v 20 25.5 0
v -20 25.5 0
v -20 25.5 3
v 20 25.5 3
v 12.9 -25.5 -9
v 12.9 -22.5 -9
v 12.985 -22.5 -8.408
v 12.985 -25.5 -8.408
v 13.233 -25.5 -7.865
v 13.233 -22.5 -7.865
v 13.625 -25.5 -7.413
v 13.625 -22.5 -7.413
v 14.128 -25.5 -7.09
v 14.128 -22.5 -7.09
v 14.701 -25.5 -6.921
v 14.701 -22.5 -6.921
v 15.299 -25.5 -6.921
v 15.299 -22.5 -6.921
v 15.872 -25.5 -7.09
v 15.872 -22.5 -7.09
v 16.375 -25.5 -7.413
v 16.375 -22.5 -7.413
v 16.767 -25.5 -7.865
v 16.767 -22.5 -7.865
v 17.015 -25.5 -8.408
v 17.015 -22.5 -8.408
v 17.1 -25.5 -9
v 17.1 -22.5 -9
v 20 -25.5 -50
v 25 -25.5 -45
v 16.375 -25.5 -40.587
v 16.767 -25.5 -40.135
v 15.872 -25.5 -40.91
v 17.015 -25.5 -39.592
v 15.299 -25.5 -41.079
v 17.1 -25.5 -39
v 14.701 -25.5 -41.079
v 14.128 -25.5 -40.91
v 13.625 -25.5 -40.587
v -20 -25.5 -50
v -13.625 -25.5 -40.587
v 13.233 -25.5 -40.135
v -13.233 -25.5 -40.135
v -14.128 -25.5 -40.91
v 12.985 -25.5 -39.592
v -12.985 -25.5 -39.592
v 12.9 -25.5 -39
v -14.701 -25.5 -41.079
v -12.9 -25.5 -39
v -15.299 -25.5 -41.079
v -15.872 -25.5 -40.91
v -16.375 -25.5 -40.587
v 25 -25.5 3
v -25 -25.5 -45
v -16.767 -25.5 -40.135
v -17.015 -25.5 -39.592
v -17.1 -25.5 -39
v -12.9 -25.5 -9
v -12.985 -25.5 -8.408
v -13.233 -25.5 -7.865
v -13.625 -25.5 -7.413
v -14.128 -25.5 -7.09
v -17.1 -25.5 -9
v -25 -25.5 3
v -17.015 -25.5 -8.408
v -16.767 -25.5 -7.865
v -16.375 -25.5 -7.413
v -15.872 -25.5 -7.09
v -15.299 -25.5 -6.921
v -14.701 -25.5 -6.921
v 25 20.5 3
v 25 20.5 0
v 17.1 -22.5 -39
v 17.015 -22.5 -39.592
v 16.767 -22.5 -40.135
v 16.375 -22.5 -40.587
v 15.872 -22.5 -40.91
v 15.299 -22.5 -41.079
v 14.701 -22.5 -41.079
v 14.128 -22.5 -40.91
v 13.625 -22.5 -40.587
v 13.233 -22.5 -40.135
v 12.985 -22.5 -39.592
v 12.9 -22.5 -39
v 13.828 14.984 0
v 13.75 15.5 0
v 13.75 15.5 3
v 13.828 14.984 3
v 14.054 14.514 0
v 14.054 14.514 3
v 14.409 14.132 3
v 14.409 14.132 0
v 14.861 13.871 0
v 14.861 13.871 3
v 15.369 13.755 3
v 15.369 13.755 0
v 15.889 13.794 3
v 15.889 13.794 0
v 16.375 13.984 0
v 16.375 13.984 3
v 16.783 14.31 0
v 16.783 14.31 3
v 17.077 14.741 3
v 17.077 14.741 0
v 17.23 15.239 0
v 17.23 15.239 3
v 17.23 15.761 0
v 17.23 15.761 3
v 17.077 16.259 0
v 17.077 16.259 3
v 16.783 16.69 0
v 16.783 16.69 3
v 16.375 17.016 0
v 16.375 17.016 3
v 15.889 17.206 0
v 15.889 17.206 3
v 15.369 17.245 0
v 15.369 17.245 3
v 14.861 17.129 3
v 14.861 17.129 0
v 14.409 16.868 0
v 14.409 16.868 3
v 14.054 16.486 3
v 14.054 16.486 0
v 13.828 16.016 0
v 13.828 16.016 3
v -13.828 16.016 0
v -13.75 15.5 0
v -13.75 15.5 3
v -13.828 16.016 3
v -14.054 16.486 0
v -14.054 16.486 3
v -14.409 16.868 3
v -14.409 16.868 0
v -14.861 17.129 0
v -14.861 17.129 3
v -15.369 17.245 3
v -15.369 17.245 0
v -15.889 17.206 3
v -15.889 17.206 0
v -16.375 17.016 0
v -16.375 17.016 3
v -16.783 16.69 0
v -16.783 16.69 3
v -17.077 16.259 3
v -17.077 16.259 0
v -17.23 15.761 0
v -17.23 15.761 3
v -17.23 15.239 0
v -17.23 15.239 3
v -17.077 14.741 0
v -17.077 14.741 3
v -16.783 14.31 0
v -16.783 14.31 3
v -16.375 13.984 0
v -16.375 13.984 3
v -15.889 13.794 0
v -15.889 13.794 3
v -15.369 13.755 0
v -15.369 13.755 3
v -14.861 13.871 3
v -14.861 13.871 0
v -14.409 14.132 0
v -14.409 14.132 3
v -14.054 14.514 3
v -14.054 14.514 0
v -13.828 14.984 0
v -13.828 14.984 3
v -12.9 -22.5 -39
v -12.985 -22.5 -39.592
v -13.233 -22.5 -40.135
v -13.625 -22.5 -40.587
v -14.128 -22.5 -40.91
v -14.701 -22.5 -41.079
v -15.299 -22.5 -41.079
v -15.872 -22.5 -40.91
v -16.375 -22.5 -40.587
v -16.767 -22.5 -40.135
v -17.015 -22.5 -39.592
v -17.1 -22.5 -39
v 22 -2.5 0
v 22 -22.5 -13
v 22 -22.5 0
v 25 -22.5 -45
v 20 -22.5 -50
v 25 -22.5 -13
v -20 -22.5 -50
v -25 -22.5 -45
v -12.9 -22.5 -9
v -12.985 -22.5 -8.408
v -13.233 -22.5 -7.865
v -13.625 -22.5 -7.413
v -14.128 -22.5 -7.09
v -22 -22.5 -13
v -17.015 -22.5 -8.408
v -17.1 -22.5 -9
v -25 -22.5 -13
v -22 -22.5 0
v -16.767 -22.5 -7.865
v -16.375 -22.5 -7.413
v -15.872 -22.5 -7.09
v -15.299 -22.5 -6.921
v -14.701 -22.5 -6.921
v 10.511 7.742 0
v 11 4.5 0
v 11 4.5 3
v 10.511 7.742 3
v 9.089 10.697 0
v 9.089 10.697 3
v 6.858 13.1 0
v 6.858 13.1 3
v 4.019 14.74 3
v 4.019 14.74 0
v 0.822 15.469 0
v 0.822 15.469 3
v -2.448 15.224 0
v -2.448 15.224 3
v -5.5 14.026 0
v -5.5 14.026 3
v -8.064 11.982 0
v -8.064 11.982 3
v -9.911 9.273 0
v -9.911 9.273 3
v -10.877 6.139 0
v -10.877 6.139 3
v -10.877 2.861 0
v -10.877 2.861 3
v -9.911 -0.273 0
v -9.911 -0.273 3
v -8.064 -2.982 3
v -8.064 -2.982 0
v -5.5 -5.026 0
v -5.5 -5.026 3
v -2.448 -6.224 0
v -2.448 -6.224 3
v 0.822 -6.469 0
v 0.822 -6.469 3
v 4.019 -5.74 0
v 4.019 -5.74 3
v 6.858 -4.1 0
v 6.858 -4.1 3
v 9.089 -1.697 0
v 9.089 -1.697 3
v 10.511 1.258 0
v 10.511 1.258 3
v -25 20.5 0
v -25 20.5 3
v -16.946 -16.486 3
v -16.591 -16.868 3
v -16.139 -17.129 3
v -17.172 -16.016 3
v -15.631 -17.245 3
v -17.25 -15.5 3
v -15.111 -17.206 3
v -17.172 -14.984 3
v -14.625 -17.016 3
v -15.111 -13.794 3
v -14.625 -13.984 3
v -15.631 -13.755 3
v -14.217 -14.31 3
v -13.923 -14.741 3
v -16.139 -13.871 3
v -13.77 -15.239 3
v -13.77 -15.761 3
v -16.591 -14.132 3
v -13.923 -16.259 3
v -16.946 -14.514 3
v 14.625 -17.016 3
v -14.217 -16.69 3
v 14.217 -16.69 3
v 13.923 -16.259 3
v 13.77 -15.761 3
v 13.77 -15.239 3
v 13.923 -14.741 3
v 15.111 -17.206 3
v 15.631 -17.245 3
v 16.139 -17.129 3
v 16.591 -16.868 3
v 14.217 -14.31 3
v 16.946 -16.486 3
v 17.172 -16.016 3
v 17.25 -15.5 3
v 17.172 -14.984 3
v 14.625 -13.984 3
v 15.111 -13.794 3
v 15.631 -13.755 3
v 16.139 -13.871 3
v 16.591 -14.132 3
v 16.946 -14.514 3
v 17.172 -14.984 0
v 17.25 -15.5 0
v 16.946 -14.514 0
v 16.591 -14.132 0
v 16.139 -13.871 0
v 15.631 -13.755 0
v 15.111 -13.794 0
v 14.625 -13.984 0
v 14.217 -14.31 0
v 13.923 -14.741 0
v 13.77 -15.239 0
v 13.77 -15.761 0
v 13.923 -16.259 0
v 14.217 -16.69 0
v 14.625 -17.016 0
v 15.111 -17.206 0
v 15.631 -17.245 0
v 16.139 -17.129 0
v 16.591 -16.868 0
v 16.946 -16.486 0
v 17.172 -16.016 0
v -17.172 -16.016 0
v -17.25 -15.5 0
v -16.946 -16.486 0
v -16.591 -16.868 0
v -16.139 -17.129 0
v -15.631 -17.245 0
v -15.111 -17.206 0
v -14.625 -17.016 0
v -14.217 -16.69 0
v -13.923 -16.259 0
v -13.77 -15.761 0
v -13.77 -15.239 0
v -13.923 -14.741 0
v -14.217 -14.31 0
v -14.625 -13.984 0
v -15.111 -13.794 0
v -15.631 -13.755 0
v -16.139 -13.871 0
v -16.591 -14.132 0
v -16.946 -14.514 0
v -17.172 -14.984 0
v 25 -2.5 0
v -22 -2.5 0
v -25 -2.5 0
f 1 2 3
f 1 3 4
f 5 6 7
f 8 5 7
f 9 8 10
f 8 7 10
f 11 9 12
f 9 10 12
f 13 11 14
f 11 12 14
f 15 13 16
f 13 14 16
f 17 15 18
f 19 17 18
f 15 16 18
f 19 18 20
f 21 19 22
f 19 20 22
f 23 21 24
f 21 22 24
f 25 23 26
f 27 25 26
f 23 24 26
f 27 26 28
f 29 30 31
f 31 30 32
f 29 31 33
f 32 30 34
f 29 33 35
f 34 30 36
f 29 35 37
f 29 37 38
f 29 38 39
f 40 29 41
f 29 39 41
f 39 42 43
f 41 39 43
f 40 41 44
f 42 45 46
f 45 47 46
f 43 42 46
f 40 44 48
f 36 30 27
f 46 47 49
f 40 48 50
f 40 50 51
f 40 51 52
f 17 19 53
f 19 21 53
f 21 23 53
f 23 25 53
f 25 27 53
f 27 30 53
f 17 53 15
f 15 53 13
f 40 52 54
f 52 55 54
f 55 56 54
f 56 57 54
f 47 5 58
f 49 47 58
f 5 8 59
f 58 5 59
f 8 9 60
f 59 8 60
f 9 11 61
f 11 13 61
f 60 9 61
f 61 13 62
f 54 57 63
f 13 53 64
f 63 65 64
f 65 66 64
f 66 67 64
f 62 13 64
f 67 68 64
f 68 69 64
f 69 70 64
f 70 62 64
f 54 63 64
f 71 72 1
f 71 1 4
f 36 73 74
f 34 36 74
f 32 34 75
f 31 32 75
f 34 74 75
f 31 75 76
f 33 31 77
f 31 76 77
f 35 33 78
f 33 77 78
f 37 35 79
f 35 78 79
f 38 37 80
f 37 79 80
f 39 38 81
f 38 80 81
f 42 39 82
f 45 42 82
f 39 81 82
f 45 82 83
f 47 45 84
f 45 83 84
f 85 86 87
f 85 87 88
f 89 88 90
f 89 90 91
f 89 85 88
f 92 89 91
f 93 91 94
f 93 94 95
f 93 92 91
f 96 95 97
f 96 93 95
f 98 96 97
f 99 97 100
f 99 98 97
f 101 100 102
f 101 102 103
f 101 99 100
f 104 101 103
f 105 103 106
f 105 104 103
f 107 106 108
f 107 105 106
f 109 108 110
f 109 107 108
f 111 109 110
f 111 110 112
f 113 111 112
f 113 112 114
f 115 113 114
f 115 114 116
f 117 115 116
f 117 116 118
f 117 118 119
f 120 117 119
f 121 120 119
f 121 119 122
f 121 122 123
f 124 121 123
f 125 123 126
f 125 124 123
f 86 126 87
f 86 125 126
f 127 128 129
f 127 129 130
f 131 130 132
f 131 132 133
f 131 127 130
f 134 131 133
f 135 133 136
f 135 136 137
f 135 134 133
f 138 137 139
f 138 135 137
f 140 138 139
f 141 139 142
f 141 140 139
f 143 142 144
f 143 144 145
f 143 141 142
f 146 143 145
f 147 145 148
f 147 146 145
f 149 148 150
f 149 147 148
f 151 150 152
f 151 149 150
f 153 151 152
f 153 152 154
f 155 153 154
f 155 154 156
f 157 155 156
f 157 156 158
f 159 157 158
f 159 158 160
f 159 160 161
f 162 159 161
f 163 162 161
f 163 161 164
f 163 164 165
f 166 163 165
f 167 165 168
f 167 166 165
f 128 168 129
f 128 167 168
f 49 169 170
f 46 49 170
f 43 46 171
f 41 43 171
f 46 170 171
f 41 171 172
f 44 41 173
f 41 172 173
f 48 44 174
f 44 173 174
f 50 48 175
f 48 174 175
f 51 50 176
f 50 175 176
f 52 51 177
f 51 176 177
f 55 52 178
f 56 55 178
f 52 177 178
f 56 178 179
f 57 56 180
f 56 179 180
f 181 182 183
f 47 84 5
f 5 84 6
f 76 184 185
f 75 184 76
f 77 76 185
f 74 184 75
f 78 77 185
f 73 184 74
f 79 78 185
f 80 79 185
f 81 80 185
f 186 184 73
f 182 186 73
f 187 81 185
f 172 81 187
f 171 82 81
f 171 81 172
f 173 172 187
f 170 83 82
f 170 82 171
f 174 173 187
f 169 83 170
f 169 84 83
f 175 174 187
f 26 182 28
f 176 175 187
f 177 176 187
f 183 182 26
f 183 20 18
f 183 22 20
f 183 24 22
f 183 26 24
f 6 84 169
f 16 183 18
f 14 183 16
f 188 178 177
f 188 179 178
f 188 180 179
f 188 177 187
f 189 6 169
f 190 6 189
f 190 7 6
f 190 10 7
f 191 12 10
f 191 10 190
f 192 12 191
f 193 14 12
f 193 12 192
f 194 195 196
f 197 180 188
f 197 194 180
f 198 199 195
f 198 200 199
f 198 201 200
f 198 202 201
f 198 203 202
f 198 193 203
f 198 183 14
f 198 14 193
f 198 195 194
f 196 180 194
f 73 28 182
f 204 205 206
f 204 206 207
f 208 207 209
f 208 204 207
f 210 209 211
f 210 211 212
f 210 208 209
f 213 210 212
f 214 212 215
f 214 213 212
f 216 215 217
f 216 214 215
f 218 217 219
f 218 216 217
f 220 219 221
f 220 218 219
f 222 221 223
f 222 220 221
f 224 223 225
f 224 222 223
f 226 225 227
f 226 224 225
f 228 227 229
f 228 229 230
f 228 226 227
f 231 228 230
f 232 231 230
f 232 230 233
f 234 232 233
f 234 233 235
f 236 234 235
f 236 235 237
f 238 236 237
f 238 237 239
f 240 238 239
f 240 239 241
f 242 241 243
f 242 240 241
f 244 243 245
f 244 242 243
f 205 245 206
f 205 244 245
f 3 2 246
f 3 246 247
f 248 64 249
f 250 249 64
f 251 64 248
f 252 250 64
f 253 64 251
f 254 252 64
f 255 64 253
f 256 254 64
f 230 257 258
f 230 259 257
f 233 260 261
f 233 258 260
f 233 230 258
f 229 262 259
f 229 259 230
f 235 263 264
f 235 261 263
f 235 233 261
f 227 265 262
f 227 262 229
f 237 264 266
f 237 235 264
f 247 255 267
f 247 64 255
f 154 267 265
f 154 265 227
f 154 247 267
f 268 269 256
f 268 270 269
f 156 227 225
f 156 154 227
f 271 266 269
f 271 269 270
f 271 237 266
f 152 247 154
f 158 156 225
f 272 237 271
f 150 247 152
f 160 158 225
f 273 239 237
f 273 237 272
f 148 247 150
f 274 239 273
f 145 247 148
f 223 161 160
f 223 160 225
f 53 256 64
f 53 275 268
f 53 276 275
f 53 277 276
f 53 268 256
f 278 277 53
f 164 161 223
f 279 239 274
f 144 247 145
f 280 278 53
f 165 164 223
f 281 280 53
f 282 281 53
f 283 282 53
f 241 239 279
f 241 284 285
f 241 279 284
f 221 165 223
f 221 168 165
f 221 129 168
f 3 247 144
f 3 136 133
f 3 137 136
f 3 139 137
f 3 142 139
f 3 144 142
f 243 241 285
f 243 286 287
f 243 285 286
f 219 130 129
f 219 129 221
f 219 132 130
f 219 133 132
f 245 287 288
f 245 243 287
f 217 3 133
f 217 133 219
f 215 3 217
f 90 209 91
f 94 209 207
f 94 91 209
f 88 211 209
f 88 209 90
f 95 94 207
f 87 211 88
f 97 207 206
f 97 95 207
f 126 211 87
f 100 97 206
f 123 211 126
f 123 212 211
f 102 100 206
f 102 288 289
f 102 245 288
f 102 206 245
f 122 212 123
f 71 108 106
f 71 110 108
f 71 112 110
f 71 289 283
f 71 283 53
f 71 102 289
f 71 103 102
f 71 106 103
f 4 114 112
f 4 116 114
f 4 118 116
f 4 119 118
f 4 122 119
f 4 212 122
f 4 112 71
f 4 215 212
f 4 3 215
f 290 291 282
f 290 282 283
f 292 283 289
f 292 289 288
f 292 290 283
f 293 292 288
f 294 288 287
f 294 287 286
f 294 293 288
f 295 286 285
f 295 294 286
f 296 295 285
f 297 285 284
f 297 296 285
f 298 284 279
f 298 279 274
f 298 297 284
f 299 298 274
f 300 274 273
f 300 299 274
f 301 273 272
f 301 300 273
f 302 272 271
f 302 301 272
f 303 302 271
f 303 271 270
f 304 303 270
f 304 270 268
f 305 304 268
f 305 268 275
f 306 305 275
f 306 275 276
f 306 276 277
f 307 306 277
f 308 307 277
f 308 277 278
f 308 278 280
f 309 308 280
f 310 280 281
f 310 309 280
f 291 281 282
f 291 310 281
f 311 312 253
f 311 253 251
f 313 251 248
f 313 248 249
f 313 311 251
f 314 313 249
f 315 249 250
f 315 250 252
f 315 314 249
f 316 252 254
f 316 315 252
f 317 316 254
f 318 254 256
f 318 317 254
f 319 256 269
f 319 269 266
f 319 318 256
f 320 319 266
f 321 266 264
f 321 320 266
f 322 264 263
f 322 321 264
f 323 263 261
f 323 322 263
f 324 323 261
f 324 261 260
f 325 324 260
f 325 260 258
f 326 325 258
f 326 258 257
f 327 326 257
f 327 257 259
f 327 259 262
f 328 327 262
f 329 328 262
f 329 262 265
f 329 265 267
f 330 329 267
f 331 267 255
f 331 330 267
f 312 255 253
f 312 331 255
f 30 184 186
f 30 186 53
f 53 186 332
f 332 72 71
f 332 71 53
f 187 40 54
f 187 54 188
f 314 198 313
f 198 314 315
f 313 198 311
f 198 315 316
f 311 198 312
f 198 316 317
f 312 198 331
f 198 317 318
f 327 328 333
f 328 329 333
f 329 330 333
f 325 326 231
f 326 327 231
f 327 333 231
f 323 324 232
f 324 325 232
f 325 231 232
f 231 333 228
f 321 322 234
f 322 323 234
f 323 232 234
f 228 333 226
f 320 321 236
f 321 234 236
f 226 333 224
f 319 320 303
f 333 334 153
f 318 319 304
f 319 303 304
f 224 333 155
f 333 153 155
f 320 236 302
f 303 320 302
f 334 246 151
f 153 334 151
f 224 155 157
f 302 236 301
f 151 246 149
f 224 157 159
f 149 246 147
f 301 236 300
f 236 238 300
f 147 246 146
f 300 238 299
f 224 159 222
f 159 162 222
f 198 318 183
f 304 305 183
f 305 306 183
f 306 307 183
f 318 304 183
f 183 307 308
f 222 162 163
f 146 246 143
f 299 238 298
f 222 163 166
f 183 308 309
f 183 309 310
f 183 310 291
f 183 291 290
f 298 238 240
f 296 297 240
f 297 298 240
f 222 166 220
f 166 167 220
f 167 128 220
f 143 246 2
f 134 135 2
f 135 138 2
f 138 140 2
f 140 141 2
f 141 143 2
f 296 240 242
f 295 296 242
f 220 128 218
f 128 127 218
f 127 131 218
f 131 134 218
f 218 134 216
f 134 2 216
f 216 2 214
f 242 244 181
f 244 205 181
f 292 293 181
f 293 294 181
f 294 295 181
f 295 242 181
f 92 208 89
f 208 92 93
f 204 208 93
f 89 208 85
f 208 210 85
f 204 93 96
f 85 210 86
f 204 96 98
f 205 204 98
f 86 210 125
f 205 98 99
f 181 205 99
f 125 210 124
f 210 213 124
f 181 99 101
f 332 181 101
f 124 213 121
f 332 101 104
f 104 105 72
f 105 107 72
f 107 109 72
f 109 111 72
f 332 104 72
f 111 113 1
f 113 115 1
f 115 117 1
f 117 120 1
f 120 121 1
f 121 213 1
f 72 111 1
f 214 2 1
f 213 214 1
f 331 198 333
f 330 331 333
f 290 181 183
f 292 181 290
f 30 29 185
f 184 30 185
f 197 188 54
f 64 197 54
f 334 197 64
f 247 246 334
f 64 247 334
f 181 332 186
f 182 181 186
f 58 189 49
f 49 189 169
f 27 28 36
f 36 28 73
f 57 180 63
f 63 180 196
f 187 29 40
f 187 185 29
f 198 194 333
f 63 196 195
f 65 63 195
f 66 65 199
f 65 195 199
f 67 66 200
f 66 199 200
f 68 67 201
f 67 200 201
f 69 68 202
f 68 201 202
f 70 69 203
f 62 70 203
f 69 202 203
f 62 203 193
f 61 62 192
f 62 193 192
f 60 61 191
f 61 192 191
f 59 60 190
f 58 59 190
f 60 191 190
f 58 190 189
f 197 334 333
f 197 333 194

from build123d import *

# Parameters (mm, degrees)
SKETCH_1_W          = 50
SKETCH_1_H          = 51
SKETCH_1_R          = 11
SKETCH_1_R_2        = 1.75
EXTRUDE_1_DEPTH     = 3
CHAMFER_1_SIZE      = 5
SKETCH_2_W          = 50
SKETCH_2_H          = 3
EXTRUDE_2_DEPTH     = 50
CHAMFER_2_SIZE      = 5
CUT_EXTRUDE_1_DEPTH = 50
EXTRUDE_3_DEPTH     = 3
EXTRUDE_4_DEPTH     = 3


with BuildPart() as part:
    # 草图1 → 凸台-拉伸1 (new body)
    with BuildSketch(Plane.XY):
        Rectangle(SKETCH_1_W, SKETCH_1_H)
        with Locations((0, 4.5)):
            Circle(SKETCH_1_R, mode=Mode.SUBTRACT)
        with Locations((-15.5, 15.5)):
            Circle(SKETCH_1_R_2, mode=Mode.SUBTRACT)
        with Locations(Location((-15.5, -15.5, 0), (0, 0, 180))):
            Circle(SKETCH_1_R_2, mode=Mode.SUBTRACT)
        with Locations((15.5, -15.5)):
            Circle(SKETCH_1_R_2, mode=Mode.SUBTRACT)
        with Locations(Location((15.5, 15.5, 0), (0, 0, 180))):
            Circle(SKETCH_1_R_2, mode=Mode.SUBTRACT)
    extrude(amount=EXTRUDE_1_DEPTH)

    # 倒角1
    chamfer_1_edges = [part.edges().sort_by_distance(p)[0] for p in [
        (-25, 25.5, 1.5),
        (25, 25.5, 1.5),
    ]]
    chamfer(chamfer_1_edges, length=CHAMFER_1_SIZE)

    # 草图2 → 凸台-拉伸2 (add)
    with BuildSketch(Plane(origin=(0, 0, 0), x_dir=(-1, 0, 0), z_dir=(0, 0, -1))):
        with Locations((0, -24)):
            Rectangle(SKETCH_2_W, SKETCH_2_H)
    extrude(amount=EXTRUDE_2_DEPTH)

    # 倒角2
    chamfer_2_edges = [part.edges().sort_by_distance(p)[0] for p in [
        (-25, -24, -50),
        (25, -24, -50),
    ]]
    chamfer(chamfer_2_edges, length=CHAMFER_2_SIZE)

    # 草图3 → 切除-拉伸1 (cut)
    with BuildSketch(Plane(origin=(0, -22.5, 0), x_dir=(1, 0, 0), z_dir=(0, 1, 0))):
        with BuildLine():
            Line((-17.1, 39), (-17.1, 9))
            ThreePointArc((-17.1, 9), (-15, 6.9), (-12.9, 9))
            Line((-12.9, 9), (-12.9, 39))
            ThreePointArc((-12.9, 39), (-15, 41.1), (-17.1, 39))
        make_face()
        with BuildLine():
            Line((12.9, 39), (12.9, 9))
            ThreePointArc((12.9, 9), (15, 6.9), (17.1, 9))
            Line((17.1, 9), (17.1, 39))
            ThreePointArc((17.1, 39), (15, 41.1), (12.9, 39))
        make_face()
    extrude(amount=-CUT_EXTRUDE_1_DEPTH, mode=Mode.SUBTRACT)

    # 草图4 → 凸台-拉伸3 (add)
    with BuildSketch(Plane(origin=(25, 0, 0), x_dir=(0, 0, -1), z_dir=(1, 0, 0))):
        Polygon((0, -2.5), (13, -22.5), (0, -22.5), align=None)
    extrude(amount=-EXTRUDE_3_DEPTH)

    # 草图5 → 凸台-拉伸4 (add)
    with BuildSketch(Plane.ZY.offset(25)):
        Polygon((0, -22.5), (0, -2.5), (-13, -22.5), align=None)
    extrude(amount=-EXTRUDE_4_DEPTH)


solid = part.part
